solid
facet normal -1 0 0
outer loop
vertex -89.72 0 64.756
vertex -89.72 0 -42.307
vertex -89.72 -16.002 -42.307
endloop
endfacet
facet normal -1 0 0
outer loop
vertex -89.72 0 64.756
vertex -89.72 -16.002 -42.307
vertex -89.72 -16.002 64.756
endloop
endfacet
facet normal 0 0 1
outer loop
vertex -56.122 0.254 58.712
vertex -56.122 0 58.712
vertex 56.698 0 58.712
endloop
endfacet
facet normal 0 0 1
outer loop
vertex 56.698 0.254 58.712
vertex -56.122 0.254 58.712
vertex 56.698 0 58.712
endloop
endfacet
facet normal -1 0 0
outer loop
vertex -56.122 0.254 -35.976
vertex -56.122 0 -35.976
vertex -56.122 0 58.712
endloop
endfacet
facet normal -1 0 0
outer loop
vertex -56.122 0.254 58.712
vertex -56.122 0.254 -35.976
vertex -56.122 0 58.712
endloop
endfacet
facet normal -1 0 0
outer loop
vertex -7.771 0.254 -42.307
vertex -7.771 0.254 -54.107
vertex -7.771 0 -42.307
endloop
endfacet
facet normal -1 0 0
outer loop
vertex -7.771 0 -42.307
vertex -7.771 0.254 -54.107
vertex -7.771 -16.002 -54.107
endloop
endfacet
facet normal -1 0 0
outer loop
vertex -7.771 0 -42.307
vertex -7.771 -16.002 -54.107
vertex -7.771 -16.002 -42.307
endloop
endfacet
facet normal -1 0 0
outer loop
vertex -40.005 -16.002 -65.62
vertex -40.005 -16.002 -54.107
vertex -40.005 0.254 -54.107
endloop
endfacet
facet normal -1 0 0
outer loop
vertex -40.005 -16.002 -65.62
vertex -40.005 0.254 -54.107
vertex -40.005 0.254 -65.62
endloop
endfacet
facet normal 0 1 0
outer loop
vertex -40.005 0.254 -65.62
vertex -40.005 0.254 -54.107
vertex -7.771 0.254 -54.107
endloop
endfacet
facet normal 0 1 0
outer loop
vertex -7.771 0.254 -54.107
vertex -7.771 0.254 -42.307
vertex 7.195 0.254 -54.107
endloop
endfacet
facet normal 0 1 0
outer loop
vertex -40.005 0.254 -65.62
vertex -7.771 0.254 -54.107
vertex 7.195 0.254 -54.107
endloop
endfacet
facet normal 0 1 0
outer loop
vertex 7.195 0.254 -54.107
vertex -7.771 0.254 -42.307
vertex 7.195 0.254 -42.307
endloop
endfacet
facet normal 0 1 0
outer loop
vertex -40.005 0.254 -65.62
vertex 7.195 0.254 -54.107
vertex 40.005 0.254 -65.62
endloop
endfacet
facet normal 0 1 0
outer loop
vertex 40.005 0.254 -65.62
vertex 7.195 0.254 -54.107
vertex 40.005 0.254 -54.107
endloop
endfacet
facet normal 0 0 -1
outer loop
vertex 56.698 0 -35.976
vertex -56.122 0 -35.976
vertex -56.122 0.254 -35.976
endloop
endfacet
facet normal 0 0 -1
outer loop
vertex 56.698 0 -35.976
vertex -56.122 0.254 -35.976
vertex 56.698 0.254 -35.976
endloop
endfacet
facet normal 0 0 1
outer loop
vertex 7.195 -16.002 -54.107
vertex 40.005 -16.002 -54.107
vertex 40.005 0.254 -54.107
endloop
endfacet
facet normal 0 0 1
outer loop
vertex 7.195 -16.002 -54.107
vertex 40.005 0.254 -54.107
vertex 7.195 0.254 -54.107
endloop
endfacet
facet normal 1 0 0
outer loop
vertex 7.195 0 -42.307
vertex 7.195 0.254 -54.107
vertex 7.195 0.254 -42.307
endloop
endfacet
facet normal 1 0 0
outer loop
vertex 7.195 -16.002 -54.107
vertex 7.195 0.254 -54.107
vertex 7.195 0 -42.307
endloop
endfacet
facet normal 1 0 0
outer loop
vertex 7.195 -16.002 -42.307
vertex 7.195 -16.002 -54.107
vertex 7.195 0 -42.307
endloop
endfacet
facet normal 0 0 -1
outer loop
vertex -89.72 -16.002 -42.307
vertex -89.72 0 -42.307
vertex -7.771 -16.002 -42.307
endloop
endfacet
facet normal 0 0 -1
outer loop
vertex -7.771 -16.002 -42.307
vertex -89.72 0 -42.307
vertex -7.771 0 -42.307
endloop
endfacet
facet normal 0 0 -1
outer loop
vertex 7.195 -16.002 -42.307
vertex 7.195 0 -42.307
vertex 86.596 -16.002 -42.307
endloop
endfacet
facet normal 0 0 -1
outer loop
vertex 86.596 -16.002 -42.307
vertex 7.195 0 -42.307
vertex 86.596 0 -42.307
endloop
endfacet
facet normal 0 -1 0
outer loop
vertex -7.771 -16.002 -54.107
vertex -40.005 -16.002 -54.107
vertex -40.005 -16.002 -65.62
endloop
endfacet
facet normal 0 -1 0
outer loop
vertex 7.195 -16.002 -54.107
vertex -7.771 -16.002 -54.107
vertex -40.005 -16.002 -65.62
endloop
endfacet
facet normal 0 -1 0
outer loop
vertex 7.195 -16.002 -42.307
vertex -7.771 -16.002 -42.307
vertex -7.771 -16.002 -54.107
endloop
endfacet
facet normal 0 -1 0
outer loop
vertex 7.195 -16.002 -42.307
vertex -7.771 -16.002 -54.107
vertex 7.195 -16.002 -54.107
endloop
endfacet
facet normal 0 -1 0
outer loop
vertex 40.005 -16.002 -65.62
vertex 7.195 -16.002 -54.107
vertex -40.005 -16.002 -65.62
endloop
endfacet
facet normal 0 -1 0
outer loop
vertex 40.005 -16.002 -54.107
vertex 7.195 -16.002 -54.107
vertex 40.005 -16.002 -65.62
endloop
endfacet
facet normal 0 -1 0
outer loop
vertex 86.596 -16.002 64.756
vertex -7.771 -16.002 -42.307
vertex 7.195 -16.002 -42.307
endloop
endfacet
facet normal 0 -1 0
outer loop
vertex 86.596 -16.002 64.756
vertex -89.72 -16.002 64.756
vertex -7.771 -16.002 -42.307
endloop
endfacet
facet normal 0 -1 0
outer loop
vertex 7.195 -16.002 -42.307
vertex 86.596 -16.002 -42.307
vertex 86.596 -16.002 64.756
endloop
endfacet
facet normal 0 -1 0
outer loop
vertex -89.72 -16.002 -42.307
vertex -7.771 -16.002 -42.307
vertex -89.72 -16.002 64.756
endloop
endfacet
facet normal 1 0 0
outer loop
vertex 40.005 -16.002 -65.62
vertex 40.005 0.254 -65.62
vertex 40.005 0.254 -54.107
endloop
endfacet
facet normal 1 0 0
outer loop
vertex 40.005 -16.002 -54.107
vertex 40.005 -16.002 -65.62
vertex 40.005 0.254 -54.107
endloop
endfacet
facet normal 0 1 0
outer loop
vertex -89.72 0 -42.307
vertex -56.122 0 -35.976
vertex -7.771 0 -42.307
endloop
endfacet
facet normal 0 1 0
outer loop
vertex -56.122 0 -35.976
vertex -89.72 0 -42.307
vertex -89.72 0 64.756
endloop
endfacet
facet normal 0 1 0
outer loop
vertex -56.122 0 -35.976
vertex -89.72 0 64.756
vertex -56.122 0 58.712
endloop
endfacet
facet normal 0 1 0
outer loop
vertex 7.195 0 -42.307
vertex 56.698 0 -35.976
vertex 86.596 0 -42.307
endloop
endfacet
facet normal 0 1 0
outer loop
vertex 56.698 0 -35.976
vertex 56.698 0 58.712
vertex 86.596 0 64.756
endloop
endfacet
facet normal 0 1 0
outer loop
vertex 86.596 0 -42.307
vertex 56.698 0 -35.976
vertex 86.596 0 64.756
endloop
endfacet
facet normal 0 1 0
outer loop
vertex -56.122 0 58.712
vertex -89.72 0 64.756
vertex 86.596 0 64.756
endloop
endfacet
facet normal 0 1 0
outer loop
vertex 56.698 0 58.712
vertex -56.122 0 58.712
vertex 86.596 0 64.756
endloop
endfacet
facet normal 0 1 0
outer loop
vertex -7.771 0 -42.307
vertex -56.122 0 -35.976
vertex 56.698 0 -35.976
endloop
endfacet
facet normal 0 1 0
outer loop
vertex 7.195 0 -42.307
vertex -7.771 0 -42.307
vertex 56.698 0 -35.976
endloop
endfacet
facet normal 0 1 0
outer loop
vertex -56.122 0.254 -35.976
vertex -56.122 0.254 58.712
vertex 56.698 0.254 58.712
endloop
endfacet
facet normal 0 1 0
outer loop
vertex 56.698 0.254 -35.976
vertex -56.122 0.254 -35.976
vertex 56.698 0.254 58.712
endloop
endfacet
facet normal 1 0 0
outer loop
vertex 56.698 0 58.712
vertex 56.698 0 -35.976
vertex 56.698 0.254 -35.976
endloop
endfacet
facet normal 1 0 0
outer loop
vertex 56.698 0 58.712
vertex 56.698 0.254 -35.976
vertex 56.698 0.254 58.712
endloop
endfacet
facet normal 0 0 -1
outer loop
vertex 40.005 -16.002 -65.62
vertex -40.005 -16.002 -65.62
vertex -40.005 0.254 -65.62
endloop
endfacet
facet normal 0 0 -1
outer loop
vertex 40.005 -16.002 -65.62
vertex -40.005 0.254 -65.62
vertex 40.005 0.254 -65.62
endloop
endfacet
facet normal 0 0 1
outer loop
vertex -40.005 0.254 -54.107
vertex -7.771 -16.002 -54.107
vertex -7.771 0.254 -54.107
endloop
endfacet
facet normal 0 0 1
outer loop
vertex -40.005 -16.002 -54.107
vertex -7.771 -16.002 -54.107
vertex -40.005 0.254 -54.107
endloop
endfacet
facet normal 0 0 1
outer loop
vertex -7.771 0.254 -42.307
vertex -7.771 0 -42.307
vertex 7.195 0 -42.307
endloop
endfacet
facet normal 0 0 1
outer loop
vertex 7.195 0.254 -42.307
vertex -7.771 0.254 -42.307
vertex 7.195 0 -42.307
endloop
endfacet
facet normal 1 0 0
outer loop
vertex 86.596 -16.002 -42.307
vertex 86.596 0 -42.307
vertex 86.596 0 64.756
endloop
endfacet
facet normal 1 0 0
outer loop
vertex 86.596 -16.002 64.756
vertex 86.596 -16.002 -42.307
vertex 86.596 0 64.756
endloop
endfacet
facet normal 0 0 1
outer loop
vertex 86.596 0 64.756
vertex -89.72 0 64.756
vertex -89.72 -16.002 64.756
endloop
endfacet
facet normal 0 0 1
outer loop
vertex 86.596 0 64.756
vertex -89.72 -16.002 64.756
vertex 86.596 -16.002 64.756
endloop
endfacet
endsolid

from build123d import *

# Parameters (mm, degrees)
F0_W     = 176.3164922595
F0_H     = 107.0637442172
F0_W_2   = 167.9538153112
F0_H_2   = 100.156404078
F1_DEPTH = 16.002
F2_W     = 14.965901617
F2_H     = 11.8000358343
F2_W_2   = 112.8198541701
F2_H_2   = 94.6880914271
F3_DEPTH = 16.256


with BuildPart() as f1:
    # F0 (on Front) → F1 (new body)
    with BuildSketch(Plane.XZ):
        with Locations((-1.561973244, 11.2244244665)):
            Rectangle(F0_W, F0_H)
        with Locations((-1.1848155409, 10.9366178513)):
            Rectangle(F0_W_2, F0_H_2, mode=Mode.SUBTRACT)
        with Locations((-1.1848155409, 10.9366178513)):
            Rectangle(F0_W_2, F0_H_2)
    extrude(amount=F1_DEPTH)

    # F2 (on face) → F3 (join)
    with BuildSketch(Plane.XZ.offset(16.002)):
        Polygon((7.1951453574, -54.1074834764), (-7.7707562596, -54.1074834764), (-40.0050021708, -54.1074834764), (-40.0050021708, -65.6197145581), (40.0049984455, -65.6197145581), (40.0049984455, -54.1074834764), align=None)
        with Locations((-0.2878054511, -48.2074655592)):
            Rectangle(F2_W, F2_H)
        with Locations((0.2878028899, 11.3683287054)):
            Rectangle(F2_W_2, F2_H_2)
    extrude(amount=-F3_DEPTH)


solid = f1.part
